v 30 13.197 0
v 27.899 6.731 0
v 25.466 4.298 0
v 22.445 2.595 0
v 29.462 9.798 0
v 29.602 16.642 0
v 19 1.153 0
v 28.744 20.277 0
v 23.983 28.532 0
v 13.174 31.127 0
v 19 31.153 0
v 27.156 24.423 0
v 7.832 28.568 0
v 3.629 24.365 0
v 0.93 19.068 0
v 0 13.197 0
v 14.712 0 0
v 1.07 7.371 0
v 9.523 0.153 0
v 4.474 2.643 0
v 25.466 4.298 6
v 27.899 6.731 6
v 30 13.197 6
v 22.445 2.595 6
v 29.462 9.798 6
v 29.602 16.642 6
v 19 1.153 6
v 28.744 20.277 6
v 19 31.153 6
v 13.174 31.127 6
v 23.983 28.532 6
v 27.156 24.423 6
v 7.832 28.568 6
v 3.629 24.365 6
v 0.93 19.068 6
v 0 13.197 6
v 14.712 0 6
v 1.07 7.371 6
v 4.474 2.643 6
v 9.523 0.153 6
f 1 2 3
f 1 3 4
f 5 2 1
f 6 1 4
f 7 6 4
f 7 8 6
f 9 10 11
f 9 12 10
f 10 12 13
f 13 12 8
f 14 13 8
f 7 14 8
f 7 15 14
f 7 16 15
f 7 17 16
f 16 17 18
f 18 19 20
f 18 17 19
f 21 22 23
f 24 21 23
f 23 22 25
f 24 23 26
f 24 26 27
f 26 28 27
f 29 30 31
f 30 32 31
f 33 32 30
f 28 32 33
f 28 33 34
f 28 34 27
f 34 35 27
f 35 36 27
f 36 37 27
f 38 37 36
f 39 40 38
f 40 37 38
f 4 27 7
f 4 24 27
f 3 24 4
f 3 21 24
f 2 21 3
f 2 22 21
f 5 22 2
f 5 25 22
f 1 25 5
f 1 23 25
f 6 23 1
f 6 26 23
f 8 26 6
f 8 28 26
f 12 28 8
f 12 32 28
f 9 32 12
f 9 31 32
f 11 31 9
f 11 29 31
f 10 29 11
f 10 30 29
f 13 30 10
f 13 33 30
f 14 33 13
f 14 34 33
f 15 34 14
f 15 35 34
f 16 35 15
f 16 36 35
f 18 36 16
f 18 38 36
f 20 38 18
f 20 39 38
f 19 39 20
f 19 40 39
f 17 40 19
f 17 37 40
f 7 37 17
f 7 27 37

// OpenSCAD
$fn = 32;

// ----------------------------------------------------------------------
// Cam disc: base radius 11.0 mm, lift 8.0 mm, 20 profile points
// ----------------------------------------------------------------------

// --- parameters (mm) ---
profile_height = 6;       // extrusion height
profile_points = 20;      // points of the closed outline

profile = [[30, 13.197], [29.602, 16.642], [28.744, 20.277], [27.156, 24.423], [23.983, 28.532], [19, 31.153], [13.174, 31.127], [7.832, 28.568], [3.629, 24.365], [0.93, 19.068], [0, 13.197], [1.07, 7.371], [4.474, 2.643], [9.523, 0.153], [14.712, 0], [19, 1.153], [22.445, 2.595], [25.466, 4.298], [27.899, 6.731], [29.462, 9.798]];  // single closed polygon, 20 points, counter clockwise

// --- the one profile operation ---
linear_extrude(height = profile_height) polygon(points = profile);
